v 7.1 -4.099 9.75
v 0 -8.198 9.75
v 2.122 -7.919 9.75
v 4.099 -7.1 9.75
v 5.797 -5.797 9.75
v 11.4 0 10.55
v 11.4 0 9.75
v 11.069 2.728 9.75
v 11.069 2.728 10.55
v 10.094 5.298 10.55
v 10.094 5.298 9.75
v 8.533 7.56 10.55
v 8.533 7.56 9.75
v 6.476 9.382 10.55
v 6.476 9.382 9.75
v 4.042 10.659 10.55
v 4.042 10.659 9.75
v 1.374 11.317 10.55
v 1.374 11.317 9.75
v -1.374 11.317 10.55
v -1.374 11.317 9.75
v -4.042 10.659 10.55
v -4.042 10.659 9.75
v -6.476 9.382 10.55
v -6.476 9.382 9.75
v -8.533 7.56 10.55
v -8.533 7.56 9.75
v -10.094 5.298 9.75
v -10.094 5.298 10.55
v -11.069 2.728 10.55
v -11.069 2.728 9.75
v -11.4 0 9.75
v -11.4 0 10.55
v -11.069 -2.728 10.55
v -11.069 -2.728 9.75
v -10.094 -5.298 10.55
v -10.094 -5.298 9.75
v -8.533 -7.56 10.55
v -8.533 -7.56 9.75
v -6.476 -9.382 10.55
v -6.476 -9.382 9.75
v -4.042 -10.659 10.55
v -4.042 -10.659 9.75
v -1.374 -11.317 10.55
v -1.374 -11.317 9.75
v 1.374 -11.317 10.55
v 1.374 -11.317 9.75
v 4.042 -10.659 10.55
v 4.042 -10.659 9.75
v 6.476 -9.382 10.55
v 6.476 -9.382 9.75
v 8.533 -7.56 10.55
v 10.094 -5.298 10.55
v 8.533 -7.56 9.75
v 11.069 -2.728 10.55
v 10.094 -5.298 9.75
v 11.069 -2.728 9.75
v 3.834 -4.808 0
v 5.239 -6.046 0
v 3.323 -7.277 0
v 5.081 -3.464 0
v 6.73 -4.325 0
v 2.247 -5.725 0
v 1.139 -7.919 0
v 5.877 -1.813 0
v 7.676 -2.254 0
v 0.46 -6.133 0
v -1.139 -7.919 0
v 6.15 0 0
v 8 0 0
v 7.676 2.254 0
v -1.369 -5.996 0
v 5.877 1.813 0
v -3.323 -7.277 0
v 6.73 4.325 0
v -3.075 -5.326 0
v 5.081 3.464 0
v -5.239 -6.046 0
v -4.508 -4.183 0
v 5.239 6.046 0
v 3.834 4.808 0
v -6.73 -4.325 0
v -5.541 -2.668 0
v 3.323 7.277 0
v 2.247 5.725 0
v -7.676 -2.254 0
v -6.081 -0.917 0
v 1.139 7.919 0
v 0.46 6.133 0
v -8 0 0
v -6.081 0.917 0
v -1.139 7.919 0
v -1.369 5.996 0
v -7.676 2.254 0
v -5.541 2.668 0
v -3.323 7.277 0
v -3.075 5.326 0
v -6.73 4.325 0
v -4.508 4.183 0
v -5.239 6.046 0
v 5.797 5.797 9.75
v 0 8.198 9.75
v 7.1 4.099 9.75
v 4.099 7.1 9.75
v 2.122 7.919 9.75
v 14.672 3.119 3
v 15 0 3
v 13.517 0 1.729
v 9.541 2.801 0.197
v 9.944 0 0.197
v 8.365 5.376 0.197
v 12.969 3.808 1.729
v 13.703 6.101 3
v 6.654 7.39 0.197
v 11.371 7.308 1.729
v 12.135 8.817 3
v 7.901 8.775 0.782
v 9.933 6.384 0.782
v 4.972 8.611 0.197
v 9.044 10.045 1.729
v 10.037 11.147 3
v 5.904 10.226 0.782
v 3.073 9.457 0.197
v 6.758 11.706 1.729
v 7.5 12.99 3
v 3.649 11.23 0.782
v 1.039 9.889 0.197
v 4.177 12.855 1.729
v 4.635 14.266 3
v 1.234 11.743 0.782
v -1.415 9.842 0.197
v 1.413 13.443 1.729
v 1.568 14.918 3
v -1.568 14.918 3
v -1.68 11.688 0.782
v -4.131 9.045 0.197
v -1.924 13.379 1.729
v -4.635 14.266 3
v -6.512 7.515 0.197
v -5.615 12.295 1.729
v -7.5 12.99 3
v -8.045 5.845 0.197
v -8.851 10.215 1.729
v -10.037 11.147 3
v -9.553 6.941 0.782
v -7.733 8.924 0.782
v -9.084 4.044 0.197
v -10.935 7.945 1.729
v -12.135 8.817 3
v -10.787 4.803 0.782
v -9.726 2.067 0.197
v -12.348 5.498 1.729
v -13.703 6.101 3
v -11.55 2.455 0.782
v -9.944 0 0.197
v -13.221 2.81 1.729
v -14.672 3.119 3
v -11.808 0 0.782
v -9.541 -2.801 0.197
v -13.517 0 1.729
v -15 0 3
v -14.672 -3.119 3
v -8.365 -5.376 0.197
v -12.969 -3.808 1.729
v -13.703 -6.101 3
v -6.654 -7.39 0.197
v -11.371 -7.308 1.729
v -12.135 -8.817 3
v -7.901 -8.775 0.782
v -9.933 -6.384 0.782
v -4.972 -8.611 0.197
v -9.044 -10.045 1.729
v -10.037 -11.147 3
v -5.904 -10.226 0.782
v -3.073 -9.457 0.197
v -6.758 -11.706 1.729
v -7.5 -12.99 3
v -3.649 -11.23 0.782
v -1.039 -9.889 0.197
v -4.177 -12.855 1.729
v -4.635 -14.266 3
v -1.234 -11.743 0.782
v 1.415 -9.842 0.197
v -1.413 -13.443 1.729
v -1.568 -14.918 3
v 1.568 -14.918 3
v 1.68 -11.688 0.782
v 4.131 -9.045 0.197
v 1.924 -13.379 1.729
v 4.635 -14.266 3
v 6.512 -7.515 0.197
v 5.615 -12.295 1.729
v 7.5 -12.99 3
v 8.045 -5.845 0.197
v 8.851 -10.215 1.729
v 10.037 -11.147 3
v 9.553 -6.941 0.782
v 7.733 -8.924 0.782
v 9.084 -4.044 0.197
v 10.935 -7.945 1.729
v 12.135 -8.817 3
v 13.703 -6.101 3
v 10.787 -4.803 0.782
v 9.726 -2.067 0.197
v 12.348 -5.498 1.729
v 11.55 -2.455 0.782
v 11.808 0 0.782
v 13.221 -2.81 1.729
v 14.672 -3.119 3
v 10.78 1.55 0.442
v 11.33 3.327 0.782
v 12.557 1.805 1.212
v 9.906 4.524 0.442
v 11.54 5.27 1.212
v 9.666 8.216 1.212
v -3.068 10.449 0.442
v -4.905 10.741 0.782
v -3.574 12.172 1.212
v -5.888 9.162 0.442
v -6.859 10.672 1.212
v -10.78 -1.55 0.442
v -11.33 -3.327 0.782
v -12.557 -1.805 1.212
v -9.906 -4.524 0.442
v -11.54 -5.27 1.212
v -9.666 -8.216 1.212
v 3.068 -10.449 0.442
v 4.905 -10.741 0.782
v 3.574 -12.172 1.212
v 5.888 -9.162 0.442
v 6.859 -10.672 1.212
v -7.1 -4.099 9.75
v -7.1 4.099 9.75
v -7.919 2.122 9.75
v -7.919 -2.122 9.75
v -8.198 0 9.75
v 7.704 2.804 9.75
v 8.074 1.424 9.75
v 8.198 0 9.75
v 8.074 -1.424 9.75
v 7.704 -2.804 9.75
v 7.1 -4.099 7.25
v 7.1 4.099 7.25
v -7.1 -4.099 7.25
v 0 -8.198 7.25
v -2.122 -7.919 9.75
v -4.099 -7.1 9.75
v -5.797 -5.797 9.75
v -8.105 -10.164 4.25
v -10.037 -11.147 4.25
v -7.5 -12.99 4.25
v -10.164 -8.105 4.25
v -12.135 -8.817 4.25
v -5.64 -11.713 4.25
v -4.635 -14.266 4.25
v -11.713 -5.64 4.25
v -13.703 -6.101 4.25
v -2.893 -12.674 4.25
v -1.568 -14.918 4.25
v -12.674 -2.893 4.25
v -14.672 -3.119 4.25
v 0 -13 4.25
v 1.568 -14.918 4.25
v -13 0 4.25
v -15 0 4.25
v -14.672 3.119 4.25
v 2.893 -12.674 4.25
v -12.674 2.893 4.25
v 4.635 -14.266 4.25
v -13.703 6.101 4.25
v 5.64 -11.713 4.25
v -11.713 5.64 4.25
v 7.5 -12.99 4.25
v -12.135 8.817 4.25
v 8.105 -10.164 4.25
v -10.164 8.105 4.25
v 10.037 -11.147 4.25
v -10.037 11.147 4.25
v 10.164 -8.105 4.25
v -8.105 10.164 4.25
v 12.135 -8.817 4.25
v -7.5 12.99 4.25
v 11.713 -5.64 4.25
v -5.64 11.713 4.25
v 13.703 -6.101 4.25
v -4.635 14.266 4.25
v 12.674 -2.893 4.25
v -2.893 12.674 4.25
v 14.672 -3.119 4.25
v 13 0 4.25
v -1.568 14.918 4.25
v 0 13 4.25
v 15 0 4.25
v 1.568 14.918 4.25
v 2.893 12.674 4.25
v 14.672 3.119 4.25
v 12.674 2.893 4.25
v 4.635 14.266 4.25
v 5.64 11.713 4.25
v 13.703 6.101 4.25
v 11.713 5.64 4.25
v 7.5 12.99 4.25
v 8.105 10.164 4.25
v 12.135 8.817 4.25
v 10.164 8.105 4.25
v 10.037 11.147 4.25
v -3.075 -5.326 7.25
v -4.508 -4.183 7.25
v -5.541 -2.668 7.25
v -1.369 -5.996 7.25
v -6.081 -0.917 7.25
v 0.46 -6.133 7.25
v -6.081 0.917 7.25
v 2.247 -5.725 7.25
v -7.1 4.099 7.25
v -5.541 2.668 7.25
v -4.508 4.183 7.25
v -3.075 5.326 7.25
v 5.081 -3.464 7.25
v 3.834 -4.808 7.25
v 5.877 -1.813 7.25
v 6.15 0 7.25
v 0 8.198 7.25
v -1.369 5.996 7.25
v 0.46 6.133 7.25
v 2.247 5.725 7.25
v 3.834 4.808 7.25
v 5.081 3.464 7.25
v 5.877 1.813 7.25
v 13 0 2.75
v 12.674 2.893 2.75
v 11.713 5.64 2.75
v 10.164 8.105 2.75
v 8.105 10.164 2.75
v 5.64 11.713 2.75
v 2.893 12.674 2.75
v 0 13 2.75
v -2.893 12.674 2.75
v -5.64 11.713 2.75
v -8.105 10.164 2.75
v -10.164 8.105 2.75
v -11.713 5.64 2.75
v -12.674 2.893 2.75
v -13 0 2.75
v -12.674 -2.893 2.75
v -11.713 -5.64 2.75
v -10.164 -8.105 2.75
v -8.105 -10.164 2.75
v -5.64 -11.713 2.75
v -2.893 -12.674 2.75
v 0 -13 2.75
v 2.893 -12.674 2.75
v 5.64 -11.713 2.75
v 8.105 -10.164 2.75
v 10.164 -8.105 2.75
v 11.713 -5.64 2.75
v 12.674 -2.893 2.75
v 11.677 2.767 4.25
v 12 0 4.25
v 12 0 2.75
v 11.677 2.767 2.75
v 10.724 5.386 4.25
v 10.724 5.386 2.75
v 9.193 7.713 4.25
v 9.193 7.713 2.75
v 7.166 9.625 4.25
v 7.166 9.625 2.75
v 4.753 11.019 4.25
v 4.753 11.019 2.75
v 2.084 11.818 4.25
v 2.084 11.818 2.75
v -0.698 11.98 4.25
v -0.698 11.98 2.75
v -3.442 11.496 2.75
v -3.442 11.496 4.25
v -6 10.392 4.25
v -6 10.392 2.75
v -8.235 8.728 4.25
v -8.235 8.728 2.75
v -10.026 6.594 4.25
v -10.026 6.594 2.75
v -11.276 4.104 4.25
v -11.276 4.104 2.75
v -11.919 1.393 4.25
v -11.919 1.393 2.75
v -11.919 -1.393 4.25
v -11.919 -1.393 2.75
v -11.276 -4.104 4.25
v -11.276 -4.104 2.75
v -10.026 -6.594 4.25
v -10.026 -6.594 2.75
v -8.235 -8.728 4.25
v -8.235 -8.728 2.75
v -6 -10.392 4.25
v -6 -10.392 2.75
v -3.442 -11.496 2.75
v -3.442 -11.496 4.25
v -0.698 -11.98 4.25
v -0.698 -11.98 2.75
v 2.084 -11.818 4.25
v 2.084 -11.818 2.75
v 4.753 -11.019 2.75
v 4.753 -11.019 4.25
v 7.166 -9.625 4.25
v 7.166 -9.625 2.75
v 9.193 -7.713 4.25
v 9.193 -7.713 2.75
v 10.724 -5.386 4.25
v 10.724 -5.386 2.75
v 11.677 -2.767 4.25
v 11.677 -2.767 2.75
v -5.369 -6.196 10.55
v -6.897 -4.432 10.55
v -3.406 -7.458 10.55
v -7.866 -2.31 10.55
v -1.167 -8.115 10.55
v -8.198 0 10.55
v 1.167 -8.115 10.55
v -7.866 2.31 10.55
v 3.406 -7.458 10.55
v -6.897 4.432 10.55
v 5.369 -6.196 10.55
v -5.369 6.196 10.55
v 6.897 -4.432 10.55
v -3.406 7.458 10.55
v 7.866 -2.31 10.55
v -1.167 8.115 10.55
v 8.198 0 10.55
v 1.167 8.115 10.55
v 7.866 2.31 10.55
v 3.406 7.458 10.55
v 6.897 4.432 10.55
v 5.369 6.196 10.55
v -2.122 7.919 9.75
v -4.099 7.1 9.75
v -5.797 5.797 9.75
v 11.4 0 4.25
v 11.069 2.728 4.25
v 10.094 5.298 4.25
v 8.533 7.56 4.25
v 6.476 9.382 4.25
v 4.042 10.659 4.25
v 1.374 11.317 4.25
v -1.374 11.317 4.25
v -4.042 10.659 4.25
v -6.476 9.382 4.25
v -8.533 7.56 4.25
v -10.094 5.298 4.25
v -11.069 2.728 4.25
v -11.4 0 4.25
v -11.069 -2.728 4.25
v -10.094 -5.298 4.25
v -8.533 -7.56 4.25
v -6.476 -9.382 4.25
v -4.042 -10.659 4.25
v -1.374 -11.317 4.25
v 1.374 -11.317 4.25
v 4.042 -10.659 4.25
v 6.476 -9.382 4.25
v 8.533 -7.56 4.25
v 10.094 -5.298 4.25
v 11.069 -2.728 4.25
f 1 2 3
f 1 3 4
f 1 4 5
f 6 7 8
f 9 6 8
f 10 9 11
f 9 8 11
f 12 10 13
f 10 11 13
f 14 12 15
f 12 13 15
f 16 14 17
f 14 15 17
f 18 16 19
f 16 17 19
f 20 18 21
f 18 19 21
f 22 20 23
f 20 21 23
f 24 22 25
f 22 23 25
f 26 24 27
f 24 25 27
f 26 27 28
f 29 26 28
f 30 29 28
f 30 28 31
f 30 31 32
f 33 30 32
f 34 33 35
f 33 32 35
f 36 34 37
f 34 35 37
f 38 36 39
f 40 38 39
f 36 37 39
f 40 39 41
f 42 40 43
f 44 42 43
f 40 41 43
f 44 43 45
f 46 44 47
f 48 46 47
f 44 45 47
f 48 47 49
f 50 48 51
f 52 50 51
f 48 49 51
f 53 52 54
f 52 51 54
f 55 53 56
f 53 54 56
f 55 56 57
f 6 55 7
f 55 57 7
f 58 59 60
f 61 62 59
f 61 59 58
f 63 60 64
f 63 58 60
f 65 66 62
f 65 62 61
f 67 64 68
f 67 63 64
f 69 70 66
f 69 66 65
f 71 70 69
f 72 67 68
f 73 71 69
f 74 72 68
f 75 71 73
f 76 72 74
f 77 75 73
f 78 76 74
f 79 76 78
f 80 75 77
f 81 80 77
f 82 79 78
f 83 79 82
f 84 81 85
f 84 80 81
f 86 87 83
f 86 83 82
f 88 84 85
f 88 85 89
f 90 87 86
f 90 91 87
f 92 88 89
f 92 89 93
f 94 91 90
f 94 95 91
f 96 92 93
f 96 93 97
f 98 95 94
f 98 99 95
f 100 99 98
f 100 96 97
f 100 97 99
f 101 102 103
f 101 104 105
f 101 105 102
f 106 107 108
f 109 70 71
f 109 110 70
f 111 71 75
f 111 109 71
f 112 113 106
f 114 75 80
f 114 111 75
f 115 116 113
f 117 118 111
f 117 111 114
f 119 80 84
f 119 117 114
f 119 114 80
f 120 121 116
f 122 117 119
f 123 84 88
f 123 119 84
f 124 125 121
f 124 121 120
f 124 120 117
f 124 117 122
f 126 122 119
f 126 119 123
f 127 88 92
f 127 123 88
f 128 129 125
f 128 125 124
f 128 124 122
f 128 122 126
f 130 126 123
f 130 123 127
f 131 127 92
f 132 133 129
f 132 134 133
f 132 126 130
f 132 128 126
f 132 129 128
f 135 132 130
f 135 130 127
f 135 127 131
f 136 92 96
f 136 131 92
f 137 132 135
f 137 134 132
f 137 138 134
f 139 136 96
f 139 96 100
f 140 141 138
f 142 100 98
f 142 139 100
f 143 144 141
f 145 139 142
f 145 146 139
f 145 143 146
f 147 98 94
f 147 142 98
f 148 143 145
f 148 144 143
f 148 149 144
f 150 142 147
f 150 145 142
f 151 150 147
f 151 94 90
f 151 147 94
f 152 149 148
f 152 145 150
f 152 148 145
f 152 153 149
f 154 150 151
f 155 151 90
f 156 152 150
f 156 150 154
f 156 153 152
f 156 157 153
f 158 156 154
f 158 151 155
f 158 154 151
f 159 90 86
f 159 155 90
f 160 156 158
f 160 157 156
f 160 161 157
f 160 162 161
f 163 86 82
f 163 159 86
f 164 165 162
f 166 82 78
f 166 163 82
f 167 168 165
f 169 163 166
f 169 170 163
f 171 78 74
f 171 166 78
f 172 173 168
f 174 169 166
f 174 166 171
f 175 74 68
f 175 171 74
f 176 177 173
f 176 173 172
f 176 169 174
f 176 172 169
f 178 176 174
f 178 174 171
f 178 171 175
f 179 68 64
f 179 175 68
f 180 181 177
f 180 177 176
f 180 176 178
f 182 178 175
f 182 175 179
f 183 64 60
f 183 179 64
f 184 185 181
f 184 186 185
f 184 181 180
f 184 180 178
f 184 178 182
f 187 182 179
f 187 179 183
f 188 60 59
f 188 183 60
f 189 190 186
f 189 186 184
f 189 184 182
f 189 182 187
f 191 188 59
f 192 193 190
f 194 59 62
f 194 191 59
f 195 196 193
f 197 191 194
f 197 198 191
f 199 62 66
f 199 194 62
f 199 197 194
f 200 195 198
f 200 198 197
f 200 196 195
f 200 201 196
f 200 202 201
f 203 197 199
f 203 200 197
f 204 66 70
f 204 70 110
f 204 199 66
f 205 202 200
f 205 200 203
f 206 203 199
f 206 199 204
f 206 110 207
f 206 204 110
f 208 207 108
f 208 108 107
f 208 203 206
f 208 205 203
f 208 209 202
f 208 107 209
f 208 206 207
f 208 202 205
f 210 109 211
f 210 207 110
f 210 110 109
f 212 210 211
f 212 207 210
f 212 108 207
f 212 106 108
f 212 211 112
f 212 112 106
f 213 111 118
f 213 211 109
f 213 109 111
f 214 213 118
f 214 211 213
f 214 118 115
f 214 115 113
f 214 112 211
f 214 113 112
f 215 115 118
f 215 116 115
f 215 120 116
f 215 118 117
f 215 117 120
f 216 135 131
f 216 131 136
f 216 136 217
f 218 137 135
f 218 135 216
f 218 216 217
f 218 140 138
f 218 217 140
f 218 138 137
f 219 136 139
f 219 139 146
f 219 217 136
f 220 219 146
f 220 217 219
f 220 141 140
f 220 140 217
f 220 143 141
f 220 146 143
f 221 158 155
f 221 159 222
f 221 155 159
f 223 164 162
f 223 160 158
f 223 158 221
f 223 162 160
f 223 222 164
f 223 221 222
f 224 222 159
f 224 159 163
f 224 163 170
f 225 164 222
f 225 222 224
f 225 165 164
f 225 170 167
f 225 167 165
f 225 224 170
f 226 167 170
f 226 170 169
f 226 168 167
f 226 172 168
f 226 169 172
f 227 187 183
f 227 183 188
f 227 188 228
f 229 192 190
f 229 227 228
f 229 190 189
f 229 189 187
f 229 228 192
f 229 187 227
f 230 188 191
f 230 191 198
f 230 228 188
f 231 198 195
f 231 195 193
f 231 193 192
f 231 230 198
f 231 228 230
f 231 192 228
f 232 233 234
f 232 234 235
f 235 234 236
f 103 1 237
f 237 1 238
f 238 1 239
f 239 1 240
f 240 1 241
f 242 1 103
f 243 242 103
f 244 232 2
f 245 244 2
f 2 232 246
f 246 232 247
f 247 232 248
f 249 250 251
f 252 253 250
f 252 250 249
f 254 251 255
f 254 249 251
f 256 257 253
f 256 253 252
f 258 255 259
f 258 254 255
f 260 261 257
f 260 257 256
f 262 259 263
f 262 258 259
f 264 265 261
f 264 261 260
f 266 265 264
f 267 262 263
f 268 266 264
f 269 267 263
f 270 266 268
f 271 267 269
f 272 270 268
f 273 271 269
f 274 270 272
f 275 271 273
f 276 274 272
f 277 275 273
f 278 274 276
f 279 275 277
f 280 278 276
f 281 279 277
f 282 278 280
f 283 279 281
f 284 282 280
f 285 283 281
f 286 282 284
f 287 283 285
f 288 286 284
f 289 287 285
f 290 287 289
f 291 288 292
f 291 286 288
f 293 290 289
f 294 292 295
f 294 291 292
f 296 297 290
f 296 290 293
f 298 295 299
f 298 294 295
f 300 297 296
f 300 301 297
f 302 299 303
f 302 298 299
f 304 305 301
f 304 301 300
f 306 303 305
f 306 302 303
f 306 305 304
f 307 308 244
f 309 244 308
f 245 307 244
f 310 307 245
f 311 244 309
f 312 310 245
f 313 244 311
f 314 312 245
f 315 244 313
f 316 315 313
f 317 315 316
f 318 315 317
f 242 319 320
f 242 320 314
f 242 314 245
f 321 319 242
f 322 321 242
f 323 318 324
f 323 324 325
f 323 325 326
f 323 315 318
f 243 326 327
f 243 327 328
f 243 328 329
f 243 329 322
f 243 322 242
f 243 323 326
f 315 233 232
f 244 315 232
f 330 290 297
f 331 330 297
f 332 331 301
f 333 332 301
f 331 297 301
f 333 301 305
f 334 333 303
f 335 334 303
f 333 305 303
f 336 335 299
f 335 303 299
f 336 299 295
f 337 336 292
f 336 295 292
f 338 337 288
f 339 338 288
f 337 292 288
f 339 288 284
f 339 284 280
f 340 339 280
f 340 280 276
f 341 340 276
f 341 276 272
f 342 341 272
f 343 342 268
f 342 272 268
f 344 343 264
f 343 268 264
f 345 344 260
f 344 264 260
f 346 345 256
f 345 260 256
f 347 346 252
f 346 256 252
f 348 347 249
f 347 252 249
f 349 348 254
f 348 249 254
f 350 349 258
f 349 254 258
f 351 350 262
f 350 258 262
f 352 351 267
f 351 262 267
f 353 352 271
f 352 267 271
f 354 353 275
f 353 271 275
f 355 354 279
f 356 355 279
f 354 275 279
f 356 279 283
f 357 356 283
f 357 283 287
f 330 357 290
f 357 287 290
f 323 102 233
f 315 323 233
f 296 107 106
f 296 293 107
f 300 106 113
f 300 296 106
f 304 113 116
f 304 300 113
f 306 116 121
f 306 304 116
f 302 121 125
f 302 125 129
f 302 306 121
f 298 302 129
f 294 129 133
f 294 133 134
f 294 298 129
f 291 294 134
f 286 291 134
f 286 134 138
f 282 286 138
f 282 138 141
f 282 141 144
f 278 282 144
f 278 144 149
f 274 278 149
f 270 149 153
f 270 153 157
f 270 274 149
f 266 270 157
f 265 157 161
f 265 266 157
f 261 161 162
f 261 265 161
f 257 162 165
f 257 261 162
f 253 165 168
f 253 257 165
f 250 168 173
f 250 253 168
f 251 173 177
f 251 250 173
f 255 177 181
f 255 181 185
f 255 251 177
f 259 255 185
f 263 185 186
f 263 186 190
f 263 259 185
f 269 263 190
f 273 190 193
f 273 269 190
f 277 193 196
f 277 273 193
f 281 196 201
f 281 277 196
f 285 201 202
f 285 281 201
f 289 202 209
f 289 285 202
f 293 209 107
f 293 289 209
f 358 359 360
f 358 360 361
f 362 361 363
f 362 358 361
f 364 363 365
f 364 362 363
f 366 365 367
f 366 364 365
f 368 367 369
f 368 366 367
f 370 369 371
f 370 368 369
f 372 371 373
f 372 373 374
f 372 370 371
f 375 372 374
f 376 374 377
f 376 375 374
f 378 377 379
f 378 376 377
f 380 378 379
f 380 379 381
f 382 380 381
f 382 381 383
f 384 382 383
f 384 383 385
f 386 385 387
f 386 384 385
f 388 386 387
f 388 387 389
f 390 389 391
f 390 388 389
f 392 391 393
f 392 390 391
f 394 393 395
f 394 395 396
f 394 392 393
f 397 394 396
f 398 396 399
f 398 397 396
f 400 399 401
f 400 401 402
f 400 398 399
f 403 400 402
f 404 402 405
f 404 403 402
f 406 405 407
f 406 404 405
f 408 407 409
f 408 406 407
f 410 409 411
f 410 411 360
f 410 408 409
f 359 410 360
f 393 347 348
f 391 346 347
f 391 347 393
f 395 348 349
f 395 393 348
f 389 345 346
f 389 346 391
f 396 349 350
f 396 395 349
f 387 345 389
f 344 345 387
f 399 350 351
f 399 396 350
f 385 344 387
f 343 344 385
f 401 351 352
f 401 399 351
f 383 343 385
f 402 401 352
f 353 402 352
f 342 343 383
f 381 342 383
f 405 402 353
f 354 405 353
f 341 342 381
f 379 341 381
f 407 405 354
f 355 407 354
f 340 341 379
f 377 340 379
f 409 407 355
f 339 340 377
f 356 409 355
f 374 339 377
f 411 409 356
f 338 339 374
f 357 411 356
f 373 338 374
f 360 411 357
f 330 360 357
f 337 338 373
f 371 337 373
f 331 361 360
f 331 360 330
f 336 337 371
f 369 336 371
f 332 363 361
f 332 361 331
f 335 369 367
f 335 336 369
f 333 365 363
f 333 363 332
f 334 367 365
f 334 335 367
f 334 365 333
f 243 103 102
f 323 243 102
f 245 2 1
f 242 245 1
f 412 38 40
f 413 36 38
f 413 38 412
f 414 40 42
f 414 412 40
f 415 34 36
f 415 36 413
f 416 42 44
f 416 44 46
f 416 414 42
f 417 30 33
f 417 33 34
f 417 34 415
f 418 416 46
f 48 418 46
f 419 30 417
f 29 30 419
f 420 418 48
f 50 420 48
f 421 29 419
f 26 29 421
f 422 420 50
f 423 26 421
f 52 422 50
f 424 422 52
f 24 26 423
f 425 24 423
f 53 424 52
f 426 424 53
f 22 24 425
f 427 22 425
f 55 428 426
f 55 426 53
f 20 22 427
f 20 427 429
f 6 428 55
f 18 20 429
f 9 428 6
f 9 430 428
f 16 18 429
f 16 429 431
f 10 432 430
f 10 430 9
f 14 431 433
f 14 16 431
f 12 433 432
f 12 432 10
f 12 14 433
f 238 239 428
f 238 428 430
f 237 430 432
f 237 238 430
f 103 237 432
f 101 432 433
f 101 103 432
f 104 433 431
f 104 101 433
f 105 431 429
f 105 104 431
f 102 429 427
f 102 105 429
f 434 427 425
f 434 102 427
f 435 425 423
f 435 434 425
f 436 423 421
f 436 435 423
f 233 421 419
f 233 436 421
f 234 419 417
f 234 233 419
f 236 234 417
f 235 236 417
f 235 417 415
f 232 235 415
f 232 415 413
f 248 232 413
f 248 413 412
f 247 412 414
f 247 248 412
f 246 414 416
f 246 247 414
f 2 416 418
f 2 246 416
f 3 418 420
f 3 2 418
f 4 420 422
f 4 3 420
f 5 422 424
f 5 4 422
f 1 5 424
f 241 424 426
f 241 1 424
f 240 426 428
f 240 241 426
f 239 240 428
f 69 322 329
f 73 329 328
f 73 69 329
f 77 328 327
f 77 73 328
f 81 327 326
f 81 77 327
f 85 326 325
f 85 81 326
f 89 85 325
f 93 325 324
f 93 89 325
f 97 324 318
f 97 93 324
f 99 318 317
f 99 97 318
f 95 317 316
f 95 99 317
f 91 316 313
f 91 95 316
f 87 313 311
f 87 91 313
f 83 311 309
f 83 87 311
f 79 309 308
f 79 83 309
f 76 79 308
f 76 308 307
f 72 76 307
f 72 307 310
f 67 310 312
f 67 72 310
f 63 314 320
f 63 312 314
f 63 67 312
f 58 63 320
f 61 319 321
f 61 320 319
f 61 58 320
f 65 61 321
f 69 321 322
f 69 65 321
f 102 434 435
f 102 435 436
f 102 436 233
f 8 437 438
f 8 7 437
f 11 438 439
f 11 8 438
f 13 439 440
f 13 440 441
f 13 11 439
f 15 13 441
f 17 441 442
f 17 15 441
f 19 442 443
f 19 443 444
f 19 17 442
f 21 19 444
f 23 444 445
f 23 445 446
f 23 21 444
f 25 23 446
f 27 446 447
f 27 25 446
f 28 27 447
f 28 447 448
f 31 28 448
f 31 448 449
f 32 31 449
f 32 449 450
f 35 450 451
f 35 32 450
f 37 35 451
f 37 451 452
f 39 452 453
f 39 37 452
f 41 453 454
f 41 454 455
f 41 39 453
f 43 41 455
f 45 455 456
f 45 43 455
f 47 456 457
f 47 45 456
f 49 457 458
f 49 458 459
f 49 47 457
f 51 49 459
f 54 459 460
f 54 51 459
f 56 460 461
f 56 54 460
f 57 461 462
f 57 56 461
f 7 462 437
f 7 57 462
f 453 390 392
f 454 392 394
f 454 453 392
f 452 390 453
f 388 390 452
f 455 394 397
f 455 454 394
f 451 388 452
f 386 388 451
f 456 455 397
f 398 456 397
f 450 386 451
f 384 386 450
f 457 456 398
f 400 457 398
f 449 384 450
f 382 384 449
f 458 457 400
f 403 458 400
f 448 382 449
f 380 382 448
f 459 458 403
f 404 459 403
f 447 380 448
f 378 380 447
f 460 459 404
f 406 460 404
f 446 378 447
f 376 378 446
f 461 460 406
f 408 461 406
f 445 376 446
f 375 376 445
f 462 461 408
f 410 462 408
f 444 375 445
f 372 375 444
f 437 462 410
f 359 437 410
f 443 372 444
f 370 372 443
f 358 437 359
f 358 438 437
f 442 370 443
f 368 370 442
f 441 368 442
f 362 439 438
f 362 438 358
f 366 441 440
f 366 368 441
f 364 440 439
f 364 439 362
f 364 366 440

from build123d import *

# Parameters (mm, degrees)
CUT_EXTRUDE2_DEPTH  = 7
SKETCH2_R           = 13
CUT_EXTRUDE1_DEPTH  = 4.5
SKETCH5_R           = 11.4
SKETCH5_R_2         = 8.198373822
BOSS_EXTRUDE2_DEPTH = 0.8
SKETCH6_R           = 13
SKETCH6_R_2         = 12
CUT_EXTRUDE3_DEPTH  = 1.5


with BuildPart() as part:
    # Sketch1 → Revolve1 (revolve)
    with BuildSketch(Plane(origin=(0, 0, 0), x_dir=(1, 0, 0), z_dir=(0, 1, 0))):
        with BuildLine():
            Line((6.15, -14.25), (6.15, 0))
            Line((6.15, 0), (8, 0))
            ThreePointArc((8, 0), (11.807886553, -0.781598043), (15, -3))
            Line((15, -3), (15, -4.25))
            Line((15, -4.25), (11.4, -4.25))
            Line((11.4, -4.25), (11.4, -14.25))
            Line((11.4, -14.25), (6.15, -14.25))
        make_face()
    revolve(axis=Axis((0, 0, 0), (0, 0, 1)))

    # Sketch3 → Cut-Extrude2 (cut)
    with BuildSketch(Plane.XY.offset(14.25)):
        Polygon((0, -8.198373822), (7.1, -4.099186911), (7.1, 4.099186911), (0, 8.198373822), (-7.1, 4.099186911), (-7.1, -4.099186911), align=None)
    extrude(amount=-CUT_EXTRUDE2_DEPTH, mode=Mode.SUBTRACT)

    # Sketch2 → Cut-Extrude1 (cut)
    with BuildSketch(Plane.XY.offset(14.25)):
        Circle(SKETCH2_R)
    extrude(amount=-CUT_EXTRUDE1_DEPTH, mode=Mode.SUBTRACT)

    # Sketch5 → Boss-Extrude2 (add)
    with BuildSketch(Plane.XY.offset(9.75)):
        Circle(SKETCH5_R)
        Circle(SKETCH5_R_2, mode=Mode.SUBTRACT)
    extrude(amount=BOSS_EXTRUDE2_DEPTH)

    # Sketch6 → Cut-Extrude3 (cut)
    with BuildSketch(Plane.XY.offset(4.25)):
        Circle(SKETCH6_R)
        Circle(SKETCH6_R_2, mode=Mode.SUBTRACT)
    extrude(amount=-CUT_EXTRUDE3_DEPTH, mode=Mode.SUBTRACT)


solid = part.part
